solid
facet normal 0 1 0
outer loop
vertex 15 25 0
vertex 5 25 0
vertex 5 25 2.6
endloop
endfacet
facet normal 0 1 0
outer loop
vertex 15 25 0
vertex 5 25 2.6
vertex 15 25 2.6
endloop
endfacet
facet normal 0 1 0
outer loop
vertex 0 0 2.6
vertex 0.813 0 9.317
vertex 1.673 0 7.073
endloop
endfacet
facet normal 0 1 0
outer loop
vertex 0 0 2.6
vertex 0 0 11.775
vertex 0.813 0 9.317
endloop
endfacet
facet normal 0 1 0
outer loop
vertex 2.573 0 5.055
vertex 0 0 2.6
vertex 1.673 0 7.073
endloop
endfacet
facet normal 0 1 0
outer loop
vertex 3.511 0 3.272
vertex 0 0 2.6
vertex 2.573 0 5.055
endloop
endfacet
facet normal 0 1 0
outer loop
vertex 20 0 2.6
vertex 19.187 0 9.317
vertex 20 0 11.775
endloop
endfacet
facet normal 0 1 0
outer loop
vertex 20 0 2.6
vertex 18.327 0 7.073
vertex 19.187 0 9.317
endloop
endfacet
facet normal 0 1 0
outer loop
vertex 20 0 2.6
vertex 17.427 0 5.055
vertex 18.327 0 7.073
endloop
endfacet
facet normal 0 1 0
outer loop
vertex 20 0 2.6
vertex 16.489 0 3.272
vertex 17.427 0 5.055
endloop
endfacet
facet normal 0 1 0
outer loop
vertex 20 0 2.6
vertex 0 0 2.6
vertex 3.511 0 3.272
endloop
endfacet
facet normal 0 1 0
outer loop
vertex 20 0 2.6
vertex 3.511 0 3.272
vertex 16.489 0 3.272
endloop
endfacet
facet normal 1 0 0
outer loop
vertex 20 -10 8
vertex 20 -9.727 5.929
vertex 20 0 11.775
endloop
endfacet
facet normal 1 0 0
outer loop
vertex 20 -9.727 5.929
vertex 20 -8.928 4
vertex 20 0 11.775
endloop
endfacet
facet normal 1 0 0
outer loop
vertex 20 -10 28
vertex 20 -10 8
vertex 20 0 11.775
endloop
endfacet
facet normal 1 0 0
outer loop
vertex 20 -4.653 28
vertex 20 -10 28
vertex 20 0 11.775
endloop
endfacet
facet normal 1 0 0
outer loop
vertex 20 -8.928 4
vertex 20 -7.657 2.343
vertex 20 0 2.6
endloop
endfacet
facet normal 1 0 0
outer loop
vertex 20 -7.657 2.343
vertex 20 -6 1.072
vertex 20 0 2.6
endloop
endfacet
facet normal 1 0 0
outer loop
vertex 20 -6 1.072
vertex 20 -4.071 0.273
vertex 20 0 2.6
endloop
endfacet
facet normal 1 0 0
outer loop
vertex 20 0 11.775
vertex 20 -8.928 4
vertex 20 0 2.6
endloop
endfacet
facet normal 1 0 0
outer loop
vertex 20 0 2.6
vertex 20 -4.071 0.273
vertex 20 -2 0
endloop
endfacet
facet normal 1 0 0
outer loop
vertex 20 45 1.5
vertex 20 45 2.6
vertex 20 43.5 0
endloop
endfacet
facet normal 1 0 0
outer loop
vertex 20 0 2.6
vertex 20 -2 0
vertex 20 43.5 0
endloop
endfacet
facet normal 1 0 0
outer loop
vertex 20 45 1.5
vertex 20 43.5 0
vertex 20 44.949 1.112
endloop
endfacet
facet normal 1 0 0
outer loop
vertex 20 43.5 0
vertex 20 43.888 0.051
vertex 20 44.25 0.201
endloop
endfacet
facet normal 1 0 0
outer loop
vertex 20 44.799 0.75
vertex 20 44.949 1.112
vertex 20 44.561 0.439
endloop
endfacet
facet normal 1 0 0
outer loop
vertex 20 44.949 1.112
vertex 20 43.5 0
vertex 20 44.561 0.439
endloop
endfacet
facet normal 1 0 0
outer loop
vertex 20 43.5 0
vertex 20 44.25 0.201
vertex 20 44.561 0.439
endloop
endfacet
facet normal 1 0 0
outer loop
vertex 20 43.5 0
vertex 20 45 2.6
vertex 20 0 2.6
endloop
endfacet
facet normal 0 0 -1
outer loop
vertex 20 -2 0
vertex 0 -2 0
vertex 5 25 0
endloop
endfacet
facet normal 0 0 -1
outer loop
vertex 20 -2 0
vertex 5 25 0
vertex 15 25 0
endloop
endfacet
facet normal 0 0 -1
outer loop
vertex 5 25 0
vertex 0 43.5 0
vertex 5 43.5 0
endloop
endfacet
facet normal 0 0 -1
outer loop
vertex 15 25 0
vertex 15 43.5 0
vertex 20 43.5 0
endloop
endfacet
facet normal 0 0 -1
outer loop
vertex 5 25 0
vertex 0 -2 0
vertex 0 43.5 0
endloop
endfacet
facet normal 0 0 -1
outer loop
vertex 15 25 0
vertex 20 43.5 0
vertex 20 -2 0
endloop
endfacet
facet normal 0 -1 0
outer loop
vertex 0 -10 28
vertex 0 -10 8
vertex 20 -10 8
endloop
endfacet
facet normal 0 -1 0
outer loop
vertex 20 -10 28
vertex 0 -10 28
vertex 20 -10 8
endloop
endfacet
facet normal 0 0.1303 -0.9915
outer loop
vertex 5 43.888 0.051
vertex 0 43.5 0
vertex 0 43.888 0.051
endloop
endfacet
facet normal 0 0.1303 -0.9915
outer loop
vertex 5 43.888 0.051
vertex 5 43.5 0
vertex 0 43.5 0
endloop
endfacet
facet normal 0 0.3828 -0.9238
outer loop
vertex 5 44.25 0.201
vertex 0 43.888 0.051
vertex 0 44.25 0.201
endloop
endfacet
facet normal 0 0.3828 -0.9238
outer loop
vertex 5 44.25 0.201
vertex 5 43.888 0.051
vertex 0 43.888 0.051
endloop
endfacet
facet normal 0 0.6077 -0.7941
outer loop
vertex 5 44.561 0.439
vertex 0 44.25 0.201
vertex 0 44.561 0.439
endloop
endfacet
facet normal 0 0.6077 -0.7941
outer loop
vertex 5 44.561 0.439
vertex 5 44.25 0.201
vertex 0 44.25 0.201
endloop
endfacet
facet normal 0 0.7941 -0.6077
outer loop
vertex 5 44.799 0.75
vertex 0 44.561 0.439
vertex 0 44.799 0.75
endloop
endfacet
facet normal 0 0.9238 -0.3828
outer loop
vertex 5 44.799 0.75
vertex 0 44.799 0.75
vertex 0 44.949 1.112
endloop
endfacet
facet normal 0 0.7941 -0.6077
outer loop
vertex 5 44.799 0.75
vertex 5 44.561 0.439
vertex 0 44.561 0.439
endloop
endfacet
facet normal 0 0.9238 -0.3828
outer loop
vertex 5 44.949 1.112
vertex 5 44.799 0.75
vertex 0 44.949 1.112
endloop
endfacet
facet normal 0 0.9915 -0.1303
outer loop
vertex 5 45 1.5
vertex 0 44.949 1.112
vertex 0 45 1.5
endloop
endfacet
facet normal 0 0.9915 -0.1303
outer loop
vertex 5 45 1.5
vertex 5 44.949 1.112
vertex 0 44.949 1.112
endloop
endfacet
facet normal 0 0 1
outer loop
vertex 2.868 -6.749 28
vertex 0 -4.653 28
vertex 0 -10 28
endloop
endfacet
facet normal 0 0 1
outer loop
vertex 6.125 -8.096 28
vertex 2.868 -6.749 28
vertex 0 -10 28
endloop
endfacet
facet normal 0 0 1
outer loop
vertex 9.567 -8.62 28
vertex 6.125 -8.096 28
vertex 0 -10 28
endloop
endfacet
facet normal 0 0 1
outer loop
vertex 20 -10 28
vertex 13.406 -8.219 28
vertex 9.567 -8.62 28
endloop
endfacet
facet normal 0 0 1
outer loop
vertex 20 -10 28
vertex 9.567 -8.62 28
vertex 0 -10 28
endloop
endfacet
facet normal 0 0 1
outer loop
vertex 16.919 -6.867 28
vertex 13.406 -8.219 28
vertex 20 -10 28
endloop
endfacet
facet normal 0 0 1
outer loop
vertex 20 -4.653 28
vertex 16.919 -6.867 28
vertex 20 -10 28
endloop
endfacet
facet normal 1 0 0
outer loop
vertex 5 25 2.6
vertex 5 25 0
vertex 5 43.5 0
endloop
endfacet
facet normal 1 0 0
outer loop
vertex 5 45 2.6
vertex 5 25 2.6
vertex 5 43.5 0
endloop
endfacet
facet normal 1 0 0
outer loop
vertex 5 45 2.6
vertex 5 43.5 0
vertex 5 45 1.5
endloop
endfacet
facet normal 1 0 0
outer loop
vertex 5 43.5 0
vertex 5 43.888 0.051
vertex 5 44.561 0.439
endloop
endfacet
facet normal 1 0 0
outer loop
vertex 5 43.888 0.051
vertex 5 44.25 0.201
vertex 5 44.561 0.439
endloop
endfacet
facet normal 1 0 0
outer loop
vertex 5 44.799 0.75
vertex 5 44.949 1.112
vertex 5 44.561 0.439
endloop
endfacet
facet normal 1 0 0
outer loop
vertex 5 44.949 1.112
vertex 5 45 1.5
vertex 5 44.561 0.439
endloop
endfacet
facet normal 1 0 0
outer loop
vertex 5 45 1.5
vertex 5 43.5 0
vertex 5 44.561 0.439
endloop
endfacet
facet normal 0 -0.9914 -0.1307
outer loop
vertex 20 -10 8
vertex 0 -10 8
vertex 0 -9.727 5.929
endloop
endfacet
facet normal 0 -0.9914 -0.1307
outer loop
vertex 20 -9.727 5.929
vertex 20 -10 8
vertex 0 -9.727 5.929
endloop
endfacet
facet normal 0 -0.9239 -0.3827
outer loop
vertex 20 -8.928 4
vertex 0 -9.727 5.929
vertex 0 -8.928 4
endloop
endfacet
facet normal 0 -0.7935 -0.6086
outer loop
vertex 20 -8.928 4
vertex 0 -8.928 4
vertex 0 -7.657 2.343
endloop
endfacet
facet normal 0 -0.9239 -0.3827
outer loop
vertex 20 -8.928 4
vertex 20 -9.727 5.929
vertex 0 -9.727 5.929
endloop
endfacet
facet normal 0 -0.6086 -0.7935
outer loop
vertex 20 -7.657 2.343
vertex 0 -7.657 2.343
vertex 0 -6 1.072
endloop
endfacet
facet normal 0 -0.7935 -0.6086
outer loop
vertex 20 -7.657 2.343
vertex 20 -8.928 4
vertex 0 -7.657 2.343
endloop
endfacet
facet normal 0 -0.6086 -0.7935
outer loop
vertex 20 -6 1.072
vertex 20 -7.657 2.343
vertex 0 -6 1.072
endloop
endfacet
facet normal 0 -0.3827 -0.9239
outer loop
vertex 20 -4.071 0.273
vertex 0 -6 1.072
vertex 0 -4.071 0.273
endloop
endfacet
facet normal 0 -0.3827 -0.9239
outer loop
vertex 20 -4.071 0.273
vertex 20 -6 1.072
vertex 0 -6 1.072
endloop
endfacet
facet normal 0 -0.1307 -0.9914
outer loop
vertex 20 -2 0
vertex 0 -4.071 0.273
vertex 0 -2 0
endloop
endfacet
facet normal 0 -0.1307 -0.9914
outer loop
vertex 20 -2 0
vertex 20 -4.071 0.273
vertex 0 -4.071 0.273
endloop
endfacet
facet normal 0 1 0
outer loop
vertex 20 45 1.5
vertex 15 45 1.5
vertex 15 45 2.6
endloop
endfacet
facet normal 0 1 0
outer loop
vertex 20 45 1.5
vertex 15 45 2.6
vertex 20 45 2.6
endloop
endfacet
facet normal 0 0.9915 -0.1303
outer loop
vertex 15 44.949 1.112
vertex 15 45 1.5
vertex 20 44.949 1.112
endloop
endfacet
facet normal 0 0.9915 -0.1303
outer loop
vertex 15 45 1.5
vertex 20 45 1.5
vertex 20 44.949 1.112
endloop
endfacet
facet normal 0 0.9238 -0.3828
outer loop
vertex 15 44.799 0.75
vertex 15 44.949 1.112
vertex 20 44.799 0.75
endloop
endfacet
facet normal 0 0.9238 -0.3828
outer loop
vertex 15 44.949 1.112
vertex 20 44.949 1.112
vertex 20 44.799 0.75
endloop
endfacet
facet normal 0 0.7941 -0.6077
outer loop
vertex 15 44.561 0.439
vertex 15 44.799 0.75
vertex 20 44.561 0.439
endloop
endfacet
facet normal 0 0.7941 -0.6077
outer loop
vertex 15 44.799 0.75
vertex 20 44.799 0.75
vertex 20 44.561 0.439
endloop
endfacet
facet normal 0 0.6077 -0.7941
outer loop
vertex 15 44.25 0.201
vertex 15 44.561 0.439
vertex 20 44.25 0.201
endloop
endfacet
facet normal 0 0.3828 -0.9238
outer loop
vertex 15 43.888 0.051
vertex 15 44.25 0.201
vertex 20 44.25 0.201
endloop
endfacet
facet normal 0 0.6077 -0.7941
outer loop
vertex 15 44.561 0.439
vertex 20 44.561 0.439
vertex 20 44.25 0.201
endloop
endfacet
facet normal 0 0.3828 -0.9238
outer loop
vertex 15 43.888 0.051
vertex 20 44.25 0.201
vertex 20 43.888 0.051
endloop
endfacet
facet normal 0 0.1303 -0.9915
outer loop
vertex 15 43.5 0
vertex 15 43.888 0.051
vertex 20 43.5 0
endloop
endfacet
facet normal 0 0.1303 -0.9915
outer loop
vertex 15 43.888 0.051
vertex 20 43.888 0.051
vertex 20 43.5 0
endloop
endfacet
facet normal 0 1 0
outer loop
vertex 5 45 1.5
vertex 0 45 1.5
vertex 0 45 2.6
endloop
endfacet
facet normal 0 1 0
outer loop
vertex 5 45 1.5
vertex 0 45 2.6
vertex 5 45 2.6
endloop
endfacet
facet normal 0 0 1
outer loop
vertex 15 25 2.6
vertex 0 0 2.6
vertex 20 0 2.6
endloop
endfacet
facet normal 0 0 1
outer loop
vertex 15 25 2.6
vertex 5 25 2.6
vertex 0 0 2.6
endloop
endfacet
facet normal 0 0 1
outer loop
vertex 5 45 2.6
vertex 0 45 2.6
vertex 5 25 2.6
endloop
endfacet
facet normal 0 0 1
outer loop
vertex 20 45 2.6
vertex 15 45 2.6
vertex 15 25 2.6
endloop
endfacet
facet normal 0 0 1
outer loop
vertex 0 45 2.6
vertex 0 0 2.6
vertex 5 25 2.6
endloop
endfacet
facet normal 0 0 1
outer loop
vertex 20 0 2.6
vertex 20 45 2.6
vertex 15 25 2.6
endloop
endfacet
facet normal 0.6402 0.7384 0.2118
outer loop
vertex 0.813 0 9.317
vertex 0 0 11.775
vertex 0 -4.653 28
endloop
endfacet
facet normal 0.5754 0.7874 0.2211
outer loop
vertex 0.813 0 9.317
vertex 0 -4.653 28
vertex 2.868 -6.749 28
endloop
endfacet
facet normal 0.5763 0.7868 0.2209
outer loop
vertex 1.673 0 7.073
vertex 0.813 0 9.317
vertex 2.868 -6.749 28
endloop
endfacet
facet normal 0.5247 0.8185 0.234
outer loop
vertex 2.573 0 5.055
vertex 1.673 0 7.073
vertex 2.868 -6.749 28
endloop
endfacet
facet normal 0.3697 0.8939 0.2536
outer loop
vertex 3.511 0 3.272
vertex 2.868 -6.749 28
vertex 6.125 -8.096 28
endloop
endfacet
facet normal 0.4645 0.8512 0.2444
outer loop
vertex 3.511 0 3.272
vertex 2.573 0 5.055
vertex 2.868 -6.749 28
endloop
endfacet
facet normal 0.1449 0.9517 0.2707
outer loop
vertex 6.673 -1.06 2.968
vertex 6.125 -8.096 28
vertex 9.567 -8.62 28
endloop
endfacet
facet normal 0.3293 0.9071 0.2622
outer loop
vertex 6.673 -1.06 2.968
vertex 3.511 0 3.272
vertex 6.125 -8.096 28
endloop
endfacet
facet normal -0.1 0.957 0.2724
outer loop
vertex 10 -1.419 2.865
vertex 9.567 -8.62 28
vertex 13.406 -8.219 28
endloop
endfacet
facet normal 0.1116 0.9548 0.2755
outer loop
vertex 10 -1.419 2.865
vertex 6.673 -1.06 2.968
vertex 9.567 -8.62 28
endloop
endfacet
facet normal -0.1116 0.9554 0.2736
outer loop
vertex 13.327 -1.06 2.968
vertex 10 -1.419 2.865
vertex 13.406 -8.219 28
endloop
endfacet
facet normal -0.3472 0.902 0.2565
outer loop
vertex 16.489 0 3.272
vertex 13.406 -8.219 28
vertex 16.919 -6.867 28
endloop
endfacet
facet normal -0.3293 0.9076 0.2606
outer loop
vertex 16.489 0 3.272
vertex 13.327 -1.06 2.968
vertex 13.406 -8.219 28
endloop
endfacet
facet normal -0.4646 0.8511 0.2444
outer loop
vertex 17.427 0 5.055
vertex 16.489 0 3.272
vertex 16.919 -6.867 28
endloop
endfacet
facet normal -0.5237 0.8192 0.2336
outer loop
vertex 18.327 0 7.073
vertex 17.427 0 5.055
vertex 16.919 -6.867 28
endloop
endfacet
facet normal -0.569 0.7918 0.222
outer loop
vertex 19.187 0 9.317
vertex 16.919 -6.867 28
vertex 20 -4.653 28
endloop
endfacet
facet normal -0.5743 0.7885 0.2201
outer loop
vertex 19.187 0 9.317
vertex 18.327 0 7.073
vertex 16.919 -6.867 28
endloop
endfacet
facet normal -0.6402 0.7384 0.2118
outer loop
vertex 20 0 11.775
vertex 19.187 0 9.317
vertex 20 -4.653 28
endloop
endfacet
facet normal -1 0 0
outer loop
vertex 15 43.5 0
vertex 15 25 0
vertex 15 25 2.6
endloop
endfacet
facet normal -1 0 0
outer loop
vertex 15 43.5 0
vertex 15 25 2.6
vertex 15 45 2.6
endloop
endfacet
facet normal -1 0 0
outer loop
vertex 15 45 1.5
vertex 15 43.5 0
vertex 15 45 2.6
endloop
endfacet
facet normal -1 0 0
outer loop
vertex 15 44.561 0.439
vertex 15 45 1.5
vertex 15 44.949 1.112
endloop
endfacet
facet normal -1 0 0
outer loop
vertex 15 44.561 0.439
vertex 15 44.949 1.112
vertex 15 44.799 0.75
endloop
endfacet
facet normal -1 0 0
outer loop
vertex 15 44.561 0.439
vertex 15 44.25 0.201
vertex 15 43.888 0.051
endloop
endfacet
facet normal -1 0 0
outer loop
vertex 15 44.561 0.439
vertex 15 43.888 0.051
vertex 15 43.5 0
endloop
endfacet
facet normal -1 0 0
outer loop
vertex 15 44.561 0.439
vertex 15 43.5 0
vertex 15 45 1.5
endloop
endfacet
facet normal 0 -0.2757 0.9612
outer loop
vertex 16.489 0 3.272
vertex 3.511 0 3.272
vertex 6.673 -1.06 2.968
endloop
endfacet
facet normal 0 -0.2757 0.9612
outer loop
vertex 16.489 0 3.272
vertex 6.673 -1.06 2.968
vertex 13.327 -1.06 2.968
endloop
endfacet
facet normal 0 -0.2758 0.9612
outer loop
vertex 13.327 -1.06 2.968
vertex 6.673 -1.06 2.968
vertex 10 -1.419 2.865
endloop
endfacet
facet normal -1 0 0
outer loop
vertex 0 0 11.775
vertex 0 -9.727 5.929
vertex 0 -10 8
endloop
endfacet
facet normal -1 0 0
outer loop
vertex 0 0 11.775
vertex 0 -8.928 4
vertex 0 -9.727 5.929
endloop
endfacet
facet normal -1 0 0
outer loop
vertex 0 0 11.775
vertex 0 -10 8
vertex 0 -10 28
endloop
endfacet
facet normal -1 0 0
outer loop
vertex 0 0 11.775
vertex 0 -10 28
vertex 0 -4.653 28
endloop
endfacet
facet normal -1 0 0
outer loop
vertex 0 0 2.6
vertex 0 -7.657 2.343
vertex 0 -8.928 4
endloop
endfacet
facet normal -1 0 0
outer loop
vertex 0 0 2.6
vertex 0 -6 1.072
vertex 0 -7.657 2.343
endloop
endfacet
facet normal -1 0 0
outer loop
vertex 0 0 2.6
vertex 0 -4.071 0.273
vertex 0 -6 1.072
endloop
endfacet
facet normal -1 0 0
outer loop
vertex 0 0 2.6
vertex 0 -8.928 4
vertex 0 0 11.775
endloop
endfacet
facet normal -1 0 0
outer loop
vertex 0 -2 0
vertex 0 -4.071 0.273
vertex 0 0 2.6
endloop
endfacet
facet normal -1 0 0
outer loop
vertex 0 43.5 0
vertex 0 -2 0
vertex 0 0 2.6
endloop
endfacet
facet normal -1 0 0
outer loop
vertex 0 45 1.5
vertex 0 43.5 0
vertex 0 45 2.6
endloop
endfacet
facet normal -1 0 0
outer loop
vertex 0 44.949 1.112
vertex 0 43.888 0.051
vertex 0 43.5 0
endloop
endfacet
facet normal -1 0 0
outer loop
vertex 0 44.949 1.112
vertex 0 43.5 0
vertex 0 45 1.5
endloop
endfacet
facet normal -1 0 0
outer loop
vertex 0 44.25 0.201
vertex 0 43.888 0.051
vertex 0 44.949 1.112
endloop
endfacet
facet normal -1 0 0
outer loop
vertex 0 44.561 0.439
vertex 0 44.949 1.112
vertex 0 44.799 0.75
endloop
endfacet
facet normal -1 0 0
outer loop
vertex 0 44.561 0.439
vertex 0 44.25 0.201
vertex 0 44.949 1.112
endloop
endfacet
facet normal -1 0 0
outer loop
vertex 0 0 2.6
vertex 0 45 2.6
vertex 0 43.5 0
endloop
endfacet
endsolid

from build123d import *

# Parameters (mm, degrees)
BOX001_W            = 10
BOX001_H            = 25
BOX001_DEPTH        = 10
BOX_W               = 20
BOX_H               = 45
BOX_DEPTH           = 2.6
CYLINDER_R          = 15
CYLINDER_DEPTH      = 27
CYLINDER_ROLL_ANGLE = 15.99999
BOX002_W            = 20
BOX002_H            = 10
BOX002_DEPTH        = 28
FILLET_R            = 8
FILLET001_R         = 1.5


with BuildPart() as box02:
    # Box001 → Box001 (new body)
    with BuildSketch(Plane(origin=(5, 25, -3), x_dir=(1, 0, 0), z_dir=(0, 0, 1))):
        with Locations((5, 12.5)):
            Rectangle(BOX001_W, BOX001_H)
    extrude(amount=BOX001_DEPTH)


with BuildPart() as patte:
    # Box → Box (new body)
    with BuildSketch(Plane.XY):
        with Locations((10, 22.5)):
            Rectangle(BOX_W, BOX_H)
    extrude(amount=BOX_DEPTH)

    # Cut: cut Box02
    add(box02.part, mode=Mode.SUBTRACT)


with BuildPart() as cylinder:
    # Cylinder → Cylinder (new body)
    with BuildSketch(Plane.XY):
        Circle(CYLINDER_R)
    extrude(amount=CYLINDER_DEPTH)


with BuildPart() as cylinder_1:
    # Cylinder roll: moved
    add(cylinder.part.rotate(Axis((0, 0, 0), (1, 0, 0)), CYLINDER_ROLL_ANGLE))


with BuildPart() as cylinder_2:
    # Cylinder placement: moved
    add(cylinder_1.part.moved(Location((10, 13, 7))))


with BuildPart() as fillet001:
    # Box002 → Box002 (new body)
    with BuildSketch(Plane(origin=(0, -10, 0), x_dir=(1, 0, 0), z_dir=(0, 0, 1))):
        with Locations((10, 5)):
            Rectangle(BOX002_W, BOX002_H)
    extrude(amount=BOX002_DEPTH)

    # Fillet
    fillet_edges = [fillet001.edges().sort_by_distance(p)[0] for p in [
        (10, -10, 0),
    ]]
    fillet(fillet_edges, radius=FILLET_R)

    # Cut001: cut Cylinder
    add(cylinder_2.part, mode=Mode.SUBTRACT)

    # Fusion: union Patte
    add(patte.part)

    # Fillet001
    fillet001_edges = [fillet001.edges().sort_by_distance(p)[0] for p in [
        (17.5, 45, 0),
        (2.5, 45, 0),
    ]]
    fillet(fillet001_edges, radius=FILLET001_R)


solid = fillet001.part
